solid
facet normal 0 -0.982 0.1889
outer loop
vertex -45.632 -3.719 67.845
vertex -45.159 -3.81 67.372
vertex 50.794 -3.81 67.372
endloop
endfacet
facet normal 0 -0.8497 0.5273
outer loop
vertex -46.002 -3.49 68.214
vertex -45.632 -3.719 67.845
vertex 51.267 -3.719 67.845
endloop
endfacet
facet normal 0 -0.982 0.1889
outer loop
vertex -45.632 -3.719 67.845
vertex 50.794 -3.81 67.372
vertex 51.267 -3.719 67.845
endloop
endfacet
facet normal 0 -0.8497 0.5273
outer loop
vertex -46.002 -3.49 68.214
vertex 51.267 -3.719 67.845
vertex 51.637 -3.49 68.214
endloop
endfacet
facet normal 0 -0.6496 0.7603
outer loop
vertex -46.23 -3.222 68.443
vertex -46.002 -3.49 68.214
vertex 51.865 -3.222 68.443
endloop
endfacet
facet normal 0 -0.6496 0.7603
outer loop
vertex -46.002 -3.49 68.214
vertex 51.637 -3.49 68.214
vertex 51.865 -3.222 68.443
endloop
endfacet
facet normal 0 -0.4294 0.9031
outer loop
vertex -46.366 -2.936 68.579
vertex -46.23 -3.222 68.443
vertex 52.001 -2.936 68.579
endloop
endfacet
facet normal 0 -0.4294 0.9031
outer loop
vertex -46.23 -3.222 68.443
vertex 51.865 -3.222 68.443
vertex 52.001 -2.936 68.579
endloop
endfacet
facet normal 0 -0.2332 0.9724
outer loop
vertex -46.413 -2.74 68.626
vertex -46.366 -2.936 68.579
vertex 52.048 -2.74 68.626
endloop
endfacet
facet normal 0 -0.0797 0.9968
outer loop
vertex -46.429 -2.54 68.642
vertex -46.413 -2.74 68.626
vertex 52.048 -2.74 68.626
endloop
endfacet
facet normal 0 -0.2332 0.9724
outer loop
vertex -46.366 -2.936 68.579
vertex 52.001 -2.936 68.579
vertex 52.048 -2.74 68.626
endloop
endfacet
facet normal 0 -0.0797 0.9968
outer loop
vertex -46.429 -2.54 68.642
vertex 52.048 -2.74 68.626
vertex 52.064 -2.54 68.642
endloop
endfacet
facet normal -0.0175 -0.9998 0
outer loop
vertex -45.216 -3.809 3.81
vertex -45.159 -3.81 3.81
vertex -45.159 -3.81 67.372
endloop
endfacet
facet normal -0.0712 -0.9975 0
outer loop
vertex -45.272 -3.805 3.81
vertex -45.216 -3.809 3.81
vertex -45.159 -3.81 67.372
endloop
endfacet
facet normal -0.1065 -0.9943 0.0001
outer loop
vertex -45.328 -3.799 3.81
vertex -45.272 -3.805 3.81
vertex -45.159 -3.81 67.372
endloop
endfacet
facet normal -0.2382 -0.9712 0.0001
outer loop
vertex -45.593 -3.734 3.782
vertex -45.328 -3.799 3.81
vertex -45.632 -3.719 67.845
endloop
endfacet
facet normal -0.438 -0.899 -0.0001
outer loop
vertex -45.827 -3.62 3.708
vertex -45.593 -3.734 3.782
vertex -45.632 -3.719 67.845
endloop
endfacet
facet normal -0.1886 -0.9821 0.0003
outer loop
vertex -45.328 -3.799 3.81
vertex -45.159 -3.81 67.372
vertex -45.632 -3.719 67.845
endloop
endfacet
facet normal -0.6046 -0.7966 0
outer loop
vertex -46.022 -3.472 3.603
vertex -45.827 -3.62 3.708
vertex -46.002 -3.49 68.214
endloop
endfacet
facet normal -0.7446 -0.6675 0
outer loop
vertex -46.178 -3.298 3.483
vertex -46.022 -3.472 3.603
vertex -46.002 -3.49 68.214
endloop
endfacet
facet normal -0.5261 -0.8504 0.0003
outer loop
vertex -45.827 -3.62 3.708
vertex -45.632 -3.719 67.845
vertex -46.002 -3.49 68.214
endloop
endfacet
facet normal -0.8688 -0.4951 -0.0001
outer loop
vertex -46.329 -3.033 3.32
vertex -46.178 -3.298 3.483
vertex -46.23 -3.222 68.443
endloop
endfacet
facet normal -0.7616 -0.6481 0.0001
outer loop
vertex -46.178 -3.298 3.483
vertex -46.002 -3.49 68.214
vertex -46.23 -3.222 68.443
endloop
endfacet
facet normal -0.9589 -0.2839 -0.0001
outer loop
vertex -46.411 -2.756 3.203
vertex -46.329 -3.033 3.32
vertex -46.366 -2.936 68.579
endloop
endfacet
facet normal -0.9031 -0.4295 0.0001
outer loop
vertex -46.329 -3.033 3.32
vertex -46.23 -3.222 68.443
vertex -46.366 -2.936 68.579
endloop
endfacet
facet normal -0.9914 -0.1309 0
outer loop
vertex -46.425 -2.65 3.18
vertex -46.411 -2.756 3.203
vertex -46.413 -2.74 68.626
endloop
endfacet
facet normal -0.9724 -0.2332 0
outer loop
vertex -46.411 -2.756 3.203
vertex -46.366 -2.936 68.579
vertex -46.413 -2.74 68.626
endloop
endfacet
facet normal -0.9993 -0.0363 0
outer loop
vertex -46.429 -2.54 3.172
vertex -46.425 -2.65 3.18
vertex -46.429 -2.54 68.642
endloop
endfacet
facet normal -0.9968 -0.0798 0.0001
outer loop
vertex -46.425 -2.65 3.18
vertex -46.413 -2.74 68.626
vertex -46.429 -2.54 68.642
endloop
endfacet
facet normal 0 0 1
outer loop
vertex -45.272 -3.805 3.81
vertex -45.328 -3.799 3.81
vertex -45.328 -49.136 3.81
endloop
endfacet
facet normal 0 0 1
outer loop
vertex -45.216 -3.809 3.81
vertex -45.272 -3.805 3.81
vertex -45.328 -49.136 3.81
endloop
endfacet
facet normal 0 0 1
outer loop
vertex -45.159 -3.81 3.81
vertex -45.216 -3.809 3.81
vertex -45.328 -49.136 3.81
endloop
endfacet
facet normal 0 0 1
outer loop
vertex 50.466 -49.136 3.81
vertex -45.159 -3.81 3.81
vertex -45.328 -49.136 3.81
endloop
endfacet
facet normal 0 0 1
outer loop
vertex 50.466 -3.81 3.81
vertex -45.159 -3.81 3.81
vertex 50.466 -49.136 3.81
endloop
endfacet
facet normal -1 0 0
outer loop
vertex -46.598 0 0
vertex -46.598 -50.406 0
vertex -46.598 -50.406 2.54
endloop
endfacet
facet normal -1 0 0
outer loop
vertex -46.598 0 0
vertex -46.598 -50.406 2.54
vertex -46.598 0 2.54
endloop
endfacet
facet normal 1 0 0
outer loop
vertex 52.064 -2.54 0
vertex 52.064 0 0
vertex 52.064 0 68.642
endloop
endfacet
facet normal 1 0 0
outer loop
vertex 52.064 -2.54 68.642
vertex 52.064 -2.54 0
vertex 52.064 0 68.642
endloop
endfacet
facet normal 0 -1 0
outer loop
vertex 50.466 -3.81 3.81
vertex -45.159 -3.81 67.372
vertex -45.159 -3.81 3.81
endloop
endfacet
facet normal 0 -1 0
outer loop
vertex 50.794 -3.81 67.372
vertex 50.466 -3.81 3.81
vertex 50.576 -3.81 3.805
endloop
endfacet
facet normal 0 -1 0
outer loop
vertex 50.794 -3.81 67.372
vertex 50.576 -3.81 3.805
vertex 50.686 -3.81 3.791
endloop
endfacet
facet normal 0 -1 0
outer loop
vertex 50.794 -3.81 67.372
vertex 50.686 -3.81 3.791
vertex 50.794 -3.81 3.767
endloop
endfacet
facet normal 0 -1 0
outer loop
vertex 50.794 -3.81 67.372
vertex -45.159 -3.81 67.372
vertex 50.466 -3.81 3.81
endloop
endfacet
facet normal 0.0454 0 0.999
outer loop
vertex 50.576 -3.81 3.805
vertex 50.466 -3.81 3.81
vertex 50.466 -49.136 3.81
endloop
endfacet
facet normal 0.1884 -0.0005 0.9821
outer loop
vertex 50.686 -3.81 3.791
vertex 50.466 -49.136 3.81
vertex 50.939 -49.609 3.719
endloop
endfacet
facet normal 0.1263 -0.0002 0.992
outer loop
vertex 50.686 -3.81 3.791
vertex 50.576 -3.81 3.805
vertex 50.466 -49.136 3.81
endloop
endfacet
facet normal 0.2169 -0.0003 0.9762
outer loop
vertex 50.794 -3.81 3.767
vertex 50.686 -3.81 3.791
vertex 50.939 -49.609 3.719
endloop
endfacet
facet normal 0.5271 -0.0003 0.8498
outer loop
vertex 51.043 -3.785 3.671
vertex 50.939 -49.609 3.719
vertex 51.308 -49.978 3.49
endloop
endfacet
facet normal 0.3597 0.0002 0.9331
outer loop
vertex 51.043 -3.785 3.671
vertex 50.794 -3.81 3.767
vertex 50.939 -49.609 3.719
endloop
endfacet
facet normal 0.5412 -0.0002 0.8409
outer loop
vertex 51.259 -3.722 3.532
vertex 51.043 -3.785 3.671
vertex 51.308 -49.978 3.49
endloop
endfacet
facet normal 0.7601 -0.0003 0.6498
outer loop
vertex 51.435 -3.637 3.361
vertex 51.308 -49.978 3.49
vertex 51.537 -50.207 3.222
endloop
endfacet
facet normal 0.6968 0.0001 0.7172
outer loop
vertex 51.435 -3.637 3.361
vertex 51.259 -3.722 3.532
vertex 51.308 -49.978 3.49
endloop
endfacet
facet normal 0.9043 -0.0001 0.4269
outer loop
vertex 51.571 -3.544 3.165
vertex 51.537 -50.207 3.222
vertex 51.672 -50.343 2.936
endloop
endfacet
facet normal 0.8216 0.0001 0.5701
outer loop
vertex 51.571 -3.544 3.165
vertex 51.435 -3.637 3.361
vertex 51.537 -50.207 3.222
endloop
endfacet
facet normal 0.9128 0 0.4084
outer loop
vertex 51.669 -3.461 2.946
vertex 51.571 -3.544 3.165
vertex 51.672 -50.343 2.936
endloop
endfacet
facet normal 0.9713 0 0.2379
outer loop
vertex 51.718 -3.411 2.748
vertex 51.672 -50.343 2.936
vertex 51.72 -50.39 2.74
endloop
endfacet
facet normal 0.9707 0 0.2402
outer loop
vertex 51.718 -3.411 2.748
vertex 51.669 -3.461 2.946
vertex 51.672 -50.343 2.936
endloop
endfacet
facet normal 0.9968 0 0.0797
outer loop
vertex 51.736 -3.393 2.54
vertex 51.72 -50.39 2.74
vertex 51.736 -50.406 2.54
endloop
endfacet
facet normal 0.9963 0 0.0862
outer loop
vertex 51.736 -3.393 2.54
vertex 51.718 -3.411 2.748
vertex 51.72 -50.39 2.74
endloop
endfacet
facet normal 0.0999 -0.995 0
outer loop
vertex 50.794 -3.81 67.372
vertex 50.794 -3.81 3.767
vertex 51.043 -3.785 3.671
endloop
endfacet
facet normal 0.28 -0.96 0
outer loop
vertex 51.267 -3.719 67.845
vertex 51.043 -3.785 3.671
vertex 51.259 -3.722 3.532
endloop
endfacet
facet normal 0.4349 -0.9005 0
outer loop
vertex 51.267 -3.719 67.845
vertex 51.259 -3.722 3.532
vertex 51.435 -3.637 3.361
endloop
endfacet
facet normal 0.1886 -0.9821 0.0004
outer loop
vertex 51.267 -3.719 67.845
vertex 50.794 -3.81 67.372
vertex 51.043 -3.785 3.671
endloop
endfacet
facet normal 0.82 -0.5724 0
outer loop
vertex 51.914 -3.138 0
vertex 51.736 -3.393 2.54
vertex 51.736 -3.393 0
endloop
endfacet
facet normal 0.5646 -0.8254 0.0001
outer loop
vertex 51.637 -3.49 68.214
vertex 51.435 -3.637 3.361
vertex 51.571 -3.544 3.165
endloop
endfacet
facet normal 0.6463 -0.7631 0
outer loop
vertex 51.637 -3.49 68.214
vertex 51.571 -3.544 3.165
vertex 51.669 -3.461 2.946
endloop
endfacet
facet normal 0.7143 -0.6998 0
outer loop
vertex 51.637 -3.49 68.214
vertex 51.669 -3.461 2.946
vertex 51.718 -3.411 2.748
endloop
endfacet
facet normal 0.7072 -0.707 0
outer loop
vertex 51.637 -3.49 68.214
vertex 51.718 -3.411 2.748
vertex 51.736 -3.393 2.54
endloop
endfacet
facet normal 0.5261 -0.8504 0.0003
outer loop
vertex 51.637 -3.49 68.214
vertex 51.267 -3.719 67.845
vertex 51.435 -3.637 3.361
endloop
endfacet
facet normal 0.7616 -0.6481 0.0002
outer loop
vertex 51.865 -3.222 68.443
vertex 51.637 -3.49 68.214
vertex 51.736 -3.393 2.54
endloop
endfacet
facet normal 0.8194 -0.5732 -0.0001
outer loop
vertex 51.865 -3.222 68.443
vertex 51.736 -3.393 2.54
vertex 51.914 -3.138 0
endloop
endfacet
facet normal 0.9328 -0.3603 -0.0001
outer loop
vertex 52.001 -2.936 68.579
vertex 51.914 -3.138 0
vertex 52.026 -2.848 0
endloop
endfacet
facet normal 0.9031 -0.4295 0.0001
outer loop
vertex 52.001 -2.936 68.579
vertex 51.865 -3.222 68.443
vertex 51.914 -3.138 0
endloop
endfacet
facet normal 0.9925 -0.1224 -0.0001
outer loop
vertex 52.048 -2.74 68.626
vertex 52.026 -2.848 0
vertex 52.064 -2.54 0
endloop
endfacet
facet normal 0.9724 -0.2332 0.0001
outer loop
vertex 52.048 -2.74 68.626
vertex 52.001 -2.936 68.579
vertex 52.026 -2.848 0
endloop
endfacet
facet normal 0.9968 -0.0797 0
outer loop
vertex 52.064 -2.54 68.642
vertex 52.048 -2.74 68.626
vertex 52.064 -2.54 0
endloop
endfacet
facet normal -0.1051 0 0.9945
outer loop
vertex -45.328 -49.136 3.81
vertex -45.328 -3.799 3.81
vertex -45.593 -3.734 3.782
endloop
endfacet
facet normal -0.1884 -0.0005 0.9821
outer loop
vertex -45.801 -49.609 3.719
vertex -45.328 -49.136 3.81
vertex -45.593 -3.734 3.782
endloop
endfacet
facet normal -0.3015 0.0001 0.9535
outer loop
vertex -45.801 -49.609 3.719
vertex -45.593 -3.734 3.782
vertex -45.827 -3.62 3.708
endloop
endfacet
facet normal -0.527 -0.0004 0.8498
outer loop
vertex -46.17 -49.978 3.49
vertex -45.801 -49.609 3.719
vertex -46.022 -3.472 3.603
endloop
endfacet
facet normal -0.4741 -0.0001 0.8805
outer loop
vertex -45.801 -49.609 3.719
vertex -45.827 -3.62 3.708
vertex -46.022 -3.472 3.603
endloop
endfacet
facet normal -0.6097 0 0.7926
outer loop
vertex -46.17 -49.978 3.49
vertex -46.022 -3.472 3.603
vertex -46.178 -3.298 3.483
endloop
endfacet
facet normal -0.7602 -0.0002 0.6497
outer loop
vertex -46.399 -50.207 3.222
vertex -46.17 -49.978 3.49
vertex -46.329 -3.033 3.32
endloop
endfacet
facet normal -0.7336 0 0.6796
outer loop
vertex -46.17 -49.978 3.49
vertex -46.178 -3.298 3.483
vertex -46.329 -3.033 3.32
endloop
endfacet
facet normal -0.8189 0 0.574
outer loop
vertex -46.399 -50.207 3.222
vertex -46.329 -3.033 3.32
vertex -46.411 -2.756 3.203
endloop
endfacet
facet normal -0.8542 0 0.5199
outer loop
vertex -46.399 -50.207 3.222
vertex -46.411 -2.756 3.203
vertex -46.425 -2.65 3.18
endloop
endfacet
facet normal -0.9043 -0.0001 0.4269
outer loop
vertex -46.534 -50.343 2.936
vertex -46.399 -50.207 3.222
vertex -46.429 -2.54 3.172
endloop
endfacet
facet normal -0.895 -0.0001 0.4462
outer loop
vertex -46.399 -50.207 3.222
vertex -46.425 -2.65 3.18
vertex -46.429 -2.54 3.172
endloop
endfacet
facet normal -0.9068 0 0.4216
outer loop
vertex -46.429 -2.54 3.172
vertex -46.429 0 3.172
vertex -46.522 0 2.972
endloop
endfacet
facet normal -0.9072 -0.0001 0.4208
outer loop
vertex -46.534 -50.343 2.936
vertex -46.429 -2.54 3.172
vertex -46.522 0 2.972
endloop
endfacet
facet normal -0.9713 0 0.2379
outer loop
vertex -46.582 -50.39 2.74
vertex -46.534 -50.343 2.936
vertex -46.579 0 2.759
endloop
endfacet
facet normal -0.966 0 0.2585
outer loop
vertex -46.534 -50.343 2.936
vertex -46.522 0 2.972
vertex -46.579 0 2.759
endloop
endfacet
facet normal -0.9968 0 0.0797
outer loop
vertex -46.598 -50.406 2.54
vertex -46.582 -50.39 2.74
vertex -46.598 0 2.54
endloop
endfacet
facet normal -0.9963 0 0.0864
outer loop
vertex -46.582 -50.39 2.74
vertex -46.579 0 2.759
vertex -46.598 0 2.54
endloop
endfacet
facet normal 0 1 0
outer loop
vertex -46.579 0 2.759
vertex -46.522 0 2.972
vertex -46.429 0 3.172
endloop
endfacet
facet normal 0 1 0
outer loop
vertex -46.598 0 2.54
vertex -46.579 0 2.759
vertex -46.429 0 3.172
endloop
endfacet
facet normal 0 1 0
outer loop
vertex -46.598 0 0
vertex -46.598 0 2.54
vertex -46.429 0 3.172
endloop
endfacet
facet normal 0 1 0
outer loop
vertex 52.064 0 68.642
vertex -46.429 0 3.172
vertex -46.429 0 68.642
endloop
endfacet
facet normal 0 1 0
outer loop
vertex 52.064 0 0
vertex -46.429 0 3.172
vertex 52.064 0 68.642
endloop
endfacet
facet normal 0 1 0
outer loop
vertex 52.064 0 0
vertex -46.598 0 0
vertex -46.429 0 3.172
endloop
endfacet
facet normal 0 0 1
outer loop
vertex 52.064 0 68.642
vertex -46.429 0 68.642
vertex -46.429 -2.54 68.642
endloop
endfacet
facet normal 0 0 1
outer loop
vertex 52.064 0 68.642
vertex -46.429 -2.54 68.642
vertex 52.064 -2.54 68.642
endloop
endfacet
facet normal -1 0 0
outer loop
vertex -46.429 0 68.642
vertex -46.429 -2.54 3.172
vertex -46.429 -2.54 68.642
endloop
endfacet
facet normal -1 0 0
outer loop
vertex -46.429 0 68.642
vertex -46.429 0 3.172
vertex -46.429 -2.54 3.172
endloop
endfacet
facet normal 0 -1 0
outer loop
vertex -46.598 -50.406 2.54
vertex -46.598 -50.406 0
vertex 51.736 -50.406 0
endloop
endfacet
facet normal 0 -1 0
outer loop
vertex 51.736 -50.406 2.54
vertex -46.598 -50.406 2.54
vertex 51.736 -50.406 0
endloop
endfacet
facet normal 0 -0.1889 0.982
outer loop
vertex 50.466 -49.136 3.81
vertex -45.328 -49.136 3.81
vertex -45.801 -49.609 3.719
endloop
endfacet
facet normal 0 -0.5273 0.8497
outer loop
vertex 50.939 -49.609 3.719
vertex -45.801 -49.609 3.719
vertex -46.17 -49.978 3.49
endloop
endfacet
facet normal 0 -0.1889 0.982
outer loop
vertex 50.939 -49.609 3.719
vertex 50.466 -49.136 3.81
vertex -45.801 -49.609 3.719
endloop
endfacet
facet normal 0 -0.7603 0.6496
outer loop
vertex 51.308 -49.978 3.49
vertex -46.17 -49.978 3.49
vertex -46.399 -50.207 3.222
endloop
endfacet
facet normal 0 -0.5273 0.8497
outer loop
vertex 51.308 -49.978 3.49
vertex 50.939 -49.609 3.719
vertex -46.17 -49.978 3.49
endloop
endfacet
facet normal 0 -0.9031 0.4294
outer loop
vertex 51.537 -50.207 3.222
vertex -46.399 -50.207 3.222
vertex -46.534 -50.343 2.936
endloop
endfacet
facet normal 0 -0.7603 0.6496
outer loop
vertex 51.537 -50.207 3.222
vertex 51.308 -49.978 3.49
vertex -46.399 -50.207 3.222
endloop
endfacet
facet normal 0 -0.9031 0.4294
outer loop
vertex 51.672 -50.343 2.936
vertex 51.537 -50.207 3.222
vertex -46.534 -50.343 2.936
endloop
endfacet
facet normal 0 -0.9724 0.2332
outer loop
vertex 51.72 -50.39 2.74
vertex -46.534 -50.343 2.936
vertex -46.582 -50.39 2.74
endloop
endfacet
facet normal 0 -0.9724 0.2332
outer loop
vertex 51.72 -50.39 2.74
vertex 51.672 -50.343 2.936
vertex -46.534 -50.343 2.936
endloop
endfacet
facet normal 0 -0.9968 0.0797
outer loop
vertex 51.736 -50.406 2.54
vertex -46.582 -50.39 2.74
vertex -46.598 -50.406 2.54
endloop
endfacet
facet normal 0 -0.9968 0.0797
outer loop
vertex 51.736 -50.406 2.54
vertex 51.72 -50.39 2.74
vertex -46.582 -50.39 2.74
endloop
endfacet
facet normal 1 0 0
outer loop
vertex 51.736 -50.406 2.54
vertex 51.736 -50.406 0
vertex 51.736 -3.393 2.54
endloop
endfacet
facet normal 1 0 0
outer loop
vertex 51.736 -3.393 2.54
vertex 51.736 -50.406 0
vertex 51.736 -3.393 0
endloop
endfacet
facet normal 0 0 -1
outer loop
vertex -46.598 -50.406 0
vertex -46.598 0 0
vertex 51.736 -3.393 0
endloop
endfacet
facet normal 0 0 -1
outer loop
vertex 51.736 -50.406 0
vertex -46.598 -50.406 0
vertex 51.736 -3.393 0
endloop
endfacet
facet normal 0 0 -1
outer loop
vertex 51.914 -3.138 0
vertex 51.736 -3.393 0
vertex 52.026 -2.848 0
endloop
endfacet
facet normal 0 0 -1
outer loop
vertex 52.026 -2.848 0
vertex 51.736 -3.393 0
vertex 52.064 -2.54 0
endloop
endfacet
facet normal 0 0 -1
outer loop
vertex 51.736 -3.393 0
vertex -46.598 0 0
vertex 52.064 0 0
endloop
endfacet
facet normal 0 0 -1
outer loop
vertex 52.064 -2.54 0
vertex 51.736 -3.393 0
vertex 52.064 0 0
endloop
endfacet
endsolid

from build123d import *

# Parameters (mm, degrees)
F1_W     = 98.493554
F1_H     = 68.641916
F2_DEPTH = 3.81
F0_W     = 98.33321
F0_H     = 50.405774
F3_DEPTH = 3.81
F4_R     = 1.27
F5_R     = 1.27


with BuildPart() as f2:
    # F1 (on Front) → F2 (new body)
    with BuildSketch(Plane.XZ):
        with Locations((2.817497, 34.320958)):
            Rectangle(F1_W, F1_H)
    extrude(amount=F2_DEPTH)

    # F0 (on Top) → F3 (join)
    with BuildSketch(Plane.XY):
        with Locations((2.568968, -25.202887)):
            Rectangle(F0_W, F0_H)
    extrude(amount=F3_DEPTH)

    # F4
    f4_edges = [f2.edges().sort_by_distance(p)[0] for p in [
        (-46.42928, -3.81, 36.225958),
        (2.817497, -3.81, 68.641916),
        (52.064274, -3.81, 34.320958),
    ]]
    fillet(f4_edges, radius=F4_R)

    # F5
    f5_edges = [f2.edges().sort_by_distance(p)[0] for p in [
        (2.568968, -50.405774, 3.81),
        (51.735573, -26.899166, 3.81),
        (-46.597637, -25.202887, 3.81),
    ]]
    fillet(f5_edges, radius=F5_R)


solid = f2.part
